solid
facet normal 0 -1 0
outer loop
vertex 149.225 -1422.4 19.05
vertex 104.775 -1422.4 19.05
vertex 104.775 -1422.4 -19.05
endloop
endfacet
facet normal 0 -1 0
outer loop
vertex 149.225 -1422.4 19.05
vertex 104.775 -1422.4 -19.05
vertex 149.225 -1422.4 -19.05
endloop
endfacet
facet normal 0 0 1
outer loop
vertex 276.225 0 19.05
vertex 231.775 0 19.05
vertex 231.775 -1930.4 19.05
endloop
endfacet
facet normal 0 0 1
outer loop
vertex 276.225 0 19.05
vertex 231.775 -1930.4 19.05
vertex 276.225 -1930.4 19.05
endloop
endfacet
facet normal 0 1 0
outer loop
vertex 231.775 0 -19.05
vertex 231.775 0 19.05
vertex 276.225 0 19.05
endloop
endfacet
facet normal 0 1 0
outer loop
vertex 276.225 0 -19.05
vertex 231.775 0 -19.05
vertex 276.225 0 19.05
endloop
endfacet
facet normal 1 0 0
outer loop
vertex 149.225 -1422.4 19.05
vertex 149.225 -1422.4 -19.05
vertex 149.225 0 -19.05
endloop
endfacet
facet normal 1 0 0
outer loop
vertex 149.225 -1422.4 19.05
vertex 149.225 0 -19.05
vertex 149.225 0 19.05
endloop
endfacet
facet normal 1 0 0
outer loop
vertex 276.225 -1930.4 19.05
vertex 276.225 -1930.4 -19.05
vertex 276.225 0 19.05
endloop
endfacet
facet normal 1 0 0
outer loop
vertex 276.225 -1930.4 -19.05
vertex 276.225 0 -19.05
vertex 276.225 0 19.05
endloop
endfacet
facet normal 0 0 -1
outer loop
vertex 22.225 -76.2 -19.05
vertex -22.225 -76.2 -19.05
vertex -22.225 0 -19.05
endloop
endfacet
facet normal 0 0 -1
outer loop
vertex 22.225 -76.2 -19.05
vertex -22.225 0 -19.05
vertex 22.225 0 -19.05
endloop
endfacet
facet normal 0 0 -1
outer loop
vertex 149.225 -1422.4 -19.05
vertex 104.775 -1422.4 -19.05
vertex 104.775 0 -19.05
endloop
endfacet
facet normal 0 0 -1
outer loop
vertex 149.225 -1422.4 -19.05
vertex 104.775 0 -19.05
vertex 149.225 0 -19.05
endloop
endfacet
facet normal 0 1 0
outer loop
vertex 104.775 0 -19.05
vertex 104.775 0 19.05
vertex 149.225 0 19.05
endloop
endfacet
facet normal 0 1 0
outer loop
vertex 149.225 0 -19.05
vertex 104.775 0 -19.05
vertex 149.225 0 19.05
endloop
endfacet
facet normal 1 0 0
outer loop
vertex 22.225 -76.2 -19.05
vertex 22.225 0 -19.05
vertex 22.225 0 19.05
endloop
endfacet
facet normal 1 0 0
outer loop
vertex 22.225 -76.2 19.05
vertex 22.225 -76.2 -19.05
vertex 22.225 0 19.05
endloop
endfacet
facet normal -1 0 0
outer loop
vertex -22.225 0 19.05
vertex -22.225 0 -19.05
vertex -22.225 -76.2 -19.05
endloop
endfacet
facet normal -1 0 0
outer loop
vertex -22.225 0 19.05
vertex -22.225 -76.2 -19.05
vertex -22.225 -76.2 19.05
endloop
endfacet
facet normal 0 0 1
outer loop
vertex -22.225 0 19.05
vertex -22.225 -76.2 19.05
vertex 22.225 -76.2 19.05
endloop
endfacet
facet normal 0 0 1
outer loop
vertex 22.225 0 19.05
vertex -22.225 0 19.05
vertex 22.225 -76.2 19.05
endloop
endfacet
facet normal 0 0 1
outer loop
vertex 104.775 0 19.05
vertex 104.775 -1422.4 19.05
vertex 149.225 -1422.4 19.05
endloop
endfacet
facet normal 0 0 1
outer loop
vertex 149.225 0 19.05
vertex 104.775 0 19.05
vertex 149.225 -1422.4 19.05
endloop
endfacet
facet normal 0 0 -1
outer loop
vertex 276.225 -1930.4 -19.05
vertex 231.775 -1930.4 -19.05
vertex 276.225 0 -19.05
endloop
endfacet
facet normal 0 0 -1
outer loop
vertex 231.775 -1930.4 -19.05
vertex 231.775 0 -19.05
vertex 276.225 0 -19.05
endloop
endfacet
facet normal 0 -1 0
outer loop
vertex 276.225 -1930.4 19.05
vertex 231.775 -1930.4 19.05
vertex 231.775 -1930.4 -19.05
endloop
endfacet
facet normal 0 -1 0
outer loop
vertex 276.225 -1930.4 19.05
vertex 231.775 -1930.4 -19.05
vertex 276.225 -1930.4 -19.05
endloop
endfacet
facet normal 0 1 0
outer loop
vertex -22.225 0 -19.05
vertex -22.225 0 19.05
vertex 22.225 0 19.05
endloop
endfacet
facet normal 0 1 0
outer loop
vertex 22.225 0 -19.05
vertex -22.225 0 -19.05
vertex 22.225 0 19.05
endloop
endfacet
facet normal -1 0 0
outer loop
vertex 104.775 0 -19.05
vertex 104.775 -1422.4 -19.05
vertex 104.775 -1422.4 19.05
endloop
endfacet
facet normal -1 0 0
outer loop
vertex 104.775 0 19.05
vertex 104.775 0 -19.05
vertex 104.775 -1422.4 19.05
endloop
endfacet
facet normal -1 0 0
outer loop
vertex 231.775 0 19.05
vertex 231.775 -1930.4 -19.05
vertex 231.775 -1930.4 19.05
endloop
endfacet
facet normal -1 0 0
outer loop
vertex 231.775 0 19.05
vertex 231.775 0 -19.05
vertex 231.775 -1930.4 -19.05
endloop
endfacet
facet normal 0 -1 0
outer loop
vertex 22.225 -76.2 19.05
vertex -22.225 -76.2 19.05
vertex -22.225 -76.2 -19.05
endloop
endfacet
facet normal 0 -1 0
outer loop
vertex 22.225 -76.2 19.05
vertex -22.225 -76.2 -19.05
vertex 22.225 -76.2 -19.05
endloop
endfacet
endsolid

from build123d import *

# Parameters (mm, degrees)
F0_W     = 44.45
F0_H     = 38.1
F1_DEPTH = 76.2
F3_DEPTH = 1346.2
F5_DEPTH = 1854.2


with BuildPart() as f1:
    # F0 (on Front) → F1 (new body)
    with BuildSketch(Plane.XZ):
        Rectangle(F0_W, F0_H)
    extrude(amount=F1_DEPTH)


with BuildPart() as f2_1:
    # F2: copy of F1
    add(f1.part.moved(Location((127, 0, 0))))

    # F3 (add): a face of the model
    f3_faces = [f2_1.faces().sort_by_distance(p)[0] for p in [
        (127, -76.2, 0),
    ]]
    extrude(f3_faces, amount=F3_DEPTH)


with BuildPart() as f4_1:
    # F4: copy of F1
    add(f1.part.moved(Location((254, 0, 0))))

    # F5 (add): a face of the model
    f5_faces = [f4_1.faces().sort_by_distance(p)[0] for p in [
        (254, -76.2, 0),
    ]]
    extrude(f5_faces, amount=F5_DEPTH)


solid = Compound([f1.part, f2_1.part, f4_1.part])
